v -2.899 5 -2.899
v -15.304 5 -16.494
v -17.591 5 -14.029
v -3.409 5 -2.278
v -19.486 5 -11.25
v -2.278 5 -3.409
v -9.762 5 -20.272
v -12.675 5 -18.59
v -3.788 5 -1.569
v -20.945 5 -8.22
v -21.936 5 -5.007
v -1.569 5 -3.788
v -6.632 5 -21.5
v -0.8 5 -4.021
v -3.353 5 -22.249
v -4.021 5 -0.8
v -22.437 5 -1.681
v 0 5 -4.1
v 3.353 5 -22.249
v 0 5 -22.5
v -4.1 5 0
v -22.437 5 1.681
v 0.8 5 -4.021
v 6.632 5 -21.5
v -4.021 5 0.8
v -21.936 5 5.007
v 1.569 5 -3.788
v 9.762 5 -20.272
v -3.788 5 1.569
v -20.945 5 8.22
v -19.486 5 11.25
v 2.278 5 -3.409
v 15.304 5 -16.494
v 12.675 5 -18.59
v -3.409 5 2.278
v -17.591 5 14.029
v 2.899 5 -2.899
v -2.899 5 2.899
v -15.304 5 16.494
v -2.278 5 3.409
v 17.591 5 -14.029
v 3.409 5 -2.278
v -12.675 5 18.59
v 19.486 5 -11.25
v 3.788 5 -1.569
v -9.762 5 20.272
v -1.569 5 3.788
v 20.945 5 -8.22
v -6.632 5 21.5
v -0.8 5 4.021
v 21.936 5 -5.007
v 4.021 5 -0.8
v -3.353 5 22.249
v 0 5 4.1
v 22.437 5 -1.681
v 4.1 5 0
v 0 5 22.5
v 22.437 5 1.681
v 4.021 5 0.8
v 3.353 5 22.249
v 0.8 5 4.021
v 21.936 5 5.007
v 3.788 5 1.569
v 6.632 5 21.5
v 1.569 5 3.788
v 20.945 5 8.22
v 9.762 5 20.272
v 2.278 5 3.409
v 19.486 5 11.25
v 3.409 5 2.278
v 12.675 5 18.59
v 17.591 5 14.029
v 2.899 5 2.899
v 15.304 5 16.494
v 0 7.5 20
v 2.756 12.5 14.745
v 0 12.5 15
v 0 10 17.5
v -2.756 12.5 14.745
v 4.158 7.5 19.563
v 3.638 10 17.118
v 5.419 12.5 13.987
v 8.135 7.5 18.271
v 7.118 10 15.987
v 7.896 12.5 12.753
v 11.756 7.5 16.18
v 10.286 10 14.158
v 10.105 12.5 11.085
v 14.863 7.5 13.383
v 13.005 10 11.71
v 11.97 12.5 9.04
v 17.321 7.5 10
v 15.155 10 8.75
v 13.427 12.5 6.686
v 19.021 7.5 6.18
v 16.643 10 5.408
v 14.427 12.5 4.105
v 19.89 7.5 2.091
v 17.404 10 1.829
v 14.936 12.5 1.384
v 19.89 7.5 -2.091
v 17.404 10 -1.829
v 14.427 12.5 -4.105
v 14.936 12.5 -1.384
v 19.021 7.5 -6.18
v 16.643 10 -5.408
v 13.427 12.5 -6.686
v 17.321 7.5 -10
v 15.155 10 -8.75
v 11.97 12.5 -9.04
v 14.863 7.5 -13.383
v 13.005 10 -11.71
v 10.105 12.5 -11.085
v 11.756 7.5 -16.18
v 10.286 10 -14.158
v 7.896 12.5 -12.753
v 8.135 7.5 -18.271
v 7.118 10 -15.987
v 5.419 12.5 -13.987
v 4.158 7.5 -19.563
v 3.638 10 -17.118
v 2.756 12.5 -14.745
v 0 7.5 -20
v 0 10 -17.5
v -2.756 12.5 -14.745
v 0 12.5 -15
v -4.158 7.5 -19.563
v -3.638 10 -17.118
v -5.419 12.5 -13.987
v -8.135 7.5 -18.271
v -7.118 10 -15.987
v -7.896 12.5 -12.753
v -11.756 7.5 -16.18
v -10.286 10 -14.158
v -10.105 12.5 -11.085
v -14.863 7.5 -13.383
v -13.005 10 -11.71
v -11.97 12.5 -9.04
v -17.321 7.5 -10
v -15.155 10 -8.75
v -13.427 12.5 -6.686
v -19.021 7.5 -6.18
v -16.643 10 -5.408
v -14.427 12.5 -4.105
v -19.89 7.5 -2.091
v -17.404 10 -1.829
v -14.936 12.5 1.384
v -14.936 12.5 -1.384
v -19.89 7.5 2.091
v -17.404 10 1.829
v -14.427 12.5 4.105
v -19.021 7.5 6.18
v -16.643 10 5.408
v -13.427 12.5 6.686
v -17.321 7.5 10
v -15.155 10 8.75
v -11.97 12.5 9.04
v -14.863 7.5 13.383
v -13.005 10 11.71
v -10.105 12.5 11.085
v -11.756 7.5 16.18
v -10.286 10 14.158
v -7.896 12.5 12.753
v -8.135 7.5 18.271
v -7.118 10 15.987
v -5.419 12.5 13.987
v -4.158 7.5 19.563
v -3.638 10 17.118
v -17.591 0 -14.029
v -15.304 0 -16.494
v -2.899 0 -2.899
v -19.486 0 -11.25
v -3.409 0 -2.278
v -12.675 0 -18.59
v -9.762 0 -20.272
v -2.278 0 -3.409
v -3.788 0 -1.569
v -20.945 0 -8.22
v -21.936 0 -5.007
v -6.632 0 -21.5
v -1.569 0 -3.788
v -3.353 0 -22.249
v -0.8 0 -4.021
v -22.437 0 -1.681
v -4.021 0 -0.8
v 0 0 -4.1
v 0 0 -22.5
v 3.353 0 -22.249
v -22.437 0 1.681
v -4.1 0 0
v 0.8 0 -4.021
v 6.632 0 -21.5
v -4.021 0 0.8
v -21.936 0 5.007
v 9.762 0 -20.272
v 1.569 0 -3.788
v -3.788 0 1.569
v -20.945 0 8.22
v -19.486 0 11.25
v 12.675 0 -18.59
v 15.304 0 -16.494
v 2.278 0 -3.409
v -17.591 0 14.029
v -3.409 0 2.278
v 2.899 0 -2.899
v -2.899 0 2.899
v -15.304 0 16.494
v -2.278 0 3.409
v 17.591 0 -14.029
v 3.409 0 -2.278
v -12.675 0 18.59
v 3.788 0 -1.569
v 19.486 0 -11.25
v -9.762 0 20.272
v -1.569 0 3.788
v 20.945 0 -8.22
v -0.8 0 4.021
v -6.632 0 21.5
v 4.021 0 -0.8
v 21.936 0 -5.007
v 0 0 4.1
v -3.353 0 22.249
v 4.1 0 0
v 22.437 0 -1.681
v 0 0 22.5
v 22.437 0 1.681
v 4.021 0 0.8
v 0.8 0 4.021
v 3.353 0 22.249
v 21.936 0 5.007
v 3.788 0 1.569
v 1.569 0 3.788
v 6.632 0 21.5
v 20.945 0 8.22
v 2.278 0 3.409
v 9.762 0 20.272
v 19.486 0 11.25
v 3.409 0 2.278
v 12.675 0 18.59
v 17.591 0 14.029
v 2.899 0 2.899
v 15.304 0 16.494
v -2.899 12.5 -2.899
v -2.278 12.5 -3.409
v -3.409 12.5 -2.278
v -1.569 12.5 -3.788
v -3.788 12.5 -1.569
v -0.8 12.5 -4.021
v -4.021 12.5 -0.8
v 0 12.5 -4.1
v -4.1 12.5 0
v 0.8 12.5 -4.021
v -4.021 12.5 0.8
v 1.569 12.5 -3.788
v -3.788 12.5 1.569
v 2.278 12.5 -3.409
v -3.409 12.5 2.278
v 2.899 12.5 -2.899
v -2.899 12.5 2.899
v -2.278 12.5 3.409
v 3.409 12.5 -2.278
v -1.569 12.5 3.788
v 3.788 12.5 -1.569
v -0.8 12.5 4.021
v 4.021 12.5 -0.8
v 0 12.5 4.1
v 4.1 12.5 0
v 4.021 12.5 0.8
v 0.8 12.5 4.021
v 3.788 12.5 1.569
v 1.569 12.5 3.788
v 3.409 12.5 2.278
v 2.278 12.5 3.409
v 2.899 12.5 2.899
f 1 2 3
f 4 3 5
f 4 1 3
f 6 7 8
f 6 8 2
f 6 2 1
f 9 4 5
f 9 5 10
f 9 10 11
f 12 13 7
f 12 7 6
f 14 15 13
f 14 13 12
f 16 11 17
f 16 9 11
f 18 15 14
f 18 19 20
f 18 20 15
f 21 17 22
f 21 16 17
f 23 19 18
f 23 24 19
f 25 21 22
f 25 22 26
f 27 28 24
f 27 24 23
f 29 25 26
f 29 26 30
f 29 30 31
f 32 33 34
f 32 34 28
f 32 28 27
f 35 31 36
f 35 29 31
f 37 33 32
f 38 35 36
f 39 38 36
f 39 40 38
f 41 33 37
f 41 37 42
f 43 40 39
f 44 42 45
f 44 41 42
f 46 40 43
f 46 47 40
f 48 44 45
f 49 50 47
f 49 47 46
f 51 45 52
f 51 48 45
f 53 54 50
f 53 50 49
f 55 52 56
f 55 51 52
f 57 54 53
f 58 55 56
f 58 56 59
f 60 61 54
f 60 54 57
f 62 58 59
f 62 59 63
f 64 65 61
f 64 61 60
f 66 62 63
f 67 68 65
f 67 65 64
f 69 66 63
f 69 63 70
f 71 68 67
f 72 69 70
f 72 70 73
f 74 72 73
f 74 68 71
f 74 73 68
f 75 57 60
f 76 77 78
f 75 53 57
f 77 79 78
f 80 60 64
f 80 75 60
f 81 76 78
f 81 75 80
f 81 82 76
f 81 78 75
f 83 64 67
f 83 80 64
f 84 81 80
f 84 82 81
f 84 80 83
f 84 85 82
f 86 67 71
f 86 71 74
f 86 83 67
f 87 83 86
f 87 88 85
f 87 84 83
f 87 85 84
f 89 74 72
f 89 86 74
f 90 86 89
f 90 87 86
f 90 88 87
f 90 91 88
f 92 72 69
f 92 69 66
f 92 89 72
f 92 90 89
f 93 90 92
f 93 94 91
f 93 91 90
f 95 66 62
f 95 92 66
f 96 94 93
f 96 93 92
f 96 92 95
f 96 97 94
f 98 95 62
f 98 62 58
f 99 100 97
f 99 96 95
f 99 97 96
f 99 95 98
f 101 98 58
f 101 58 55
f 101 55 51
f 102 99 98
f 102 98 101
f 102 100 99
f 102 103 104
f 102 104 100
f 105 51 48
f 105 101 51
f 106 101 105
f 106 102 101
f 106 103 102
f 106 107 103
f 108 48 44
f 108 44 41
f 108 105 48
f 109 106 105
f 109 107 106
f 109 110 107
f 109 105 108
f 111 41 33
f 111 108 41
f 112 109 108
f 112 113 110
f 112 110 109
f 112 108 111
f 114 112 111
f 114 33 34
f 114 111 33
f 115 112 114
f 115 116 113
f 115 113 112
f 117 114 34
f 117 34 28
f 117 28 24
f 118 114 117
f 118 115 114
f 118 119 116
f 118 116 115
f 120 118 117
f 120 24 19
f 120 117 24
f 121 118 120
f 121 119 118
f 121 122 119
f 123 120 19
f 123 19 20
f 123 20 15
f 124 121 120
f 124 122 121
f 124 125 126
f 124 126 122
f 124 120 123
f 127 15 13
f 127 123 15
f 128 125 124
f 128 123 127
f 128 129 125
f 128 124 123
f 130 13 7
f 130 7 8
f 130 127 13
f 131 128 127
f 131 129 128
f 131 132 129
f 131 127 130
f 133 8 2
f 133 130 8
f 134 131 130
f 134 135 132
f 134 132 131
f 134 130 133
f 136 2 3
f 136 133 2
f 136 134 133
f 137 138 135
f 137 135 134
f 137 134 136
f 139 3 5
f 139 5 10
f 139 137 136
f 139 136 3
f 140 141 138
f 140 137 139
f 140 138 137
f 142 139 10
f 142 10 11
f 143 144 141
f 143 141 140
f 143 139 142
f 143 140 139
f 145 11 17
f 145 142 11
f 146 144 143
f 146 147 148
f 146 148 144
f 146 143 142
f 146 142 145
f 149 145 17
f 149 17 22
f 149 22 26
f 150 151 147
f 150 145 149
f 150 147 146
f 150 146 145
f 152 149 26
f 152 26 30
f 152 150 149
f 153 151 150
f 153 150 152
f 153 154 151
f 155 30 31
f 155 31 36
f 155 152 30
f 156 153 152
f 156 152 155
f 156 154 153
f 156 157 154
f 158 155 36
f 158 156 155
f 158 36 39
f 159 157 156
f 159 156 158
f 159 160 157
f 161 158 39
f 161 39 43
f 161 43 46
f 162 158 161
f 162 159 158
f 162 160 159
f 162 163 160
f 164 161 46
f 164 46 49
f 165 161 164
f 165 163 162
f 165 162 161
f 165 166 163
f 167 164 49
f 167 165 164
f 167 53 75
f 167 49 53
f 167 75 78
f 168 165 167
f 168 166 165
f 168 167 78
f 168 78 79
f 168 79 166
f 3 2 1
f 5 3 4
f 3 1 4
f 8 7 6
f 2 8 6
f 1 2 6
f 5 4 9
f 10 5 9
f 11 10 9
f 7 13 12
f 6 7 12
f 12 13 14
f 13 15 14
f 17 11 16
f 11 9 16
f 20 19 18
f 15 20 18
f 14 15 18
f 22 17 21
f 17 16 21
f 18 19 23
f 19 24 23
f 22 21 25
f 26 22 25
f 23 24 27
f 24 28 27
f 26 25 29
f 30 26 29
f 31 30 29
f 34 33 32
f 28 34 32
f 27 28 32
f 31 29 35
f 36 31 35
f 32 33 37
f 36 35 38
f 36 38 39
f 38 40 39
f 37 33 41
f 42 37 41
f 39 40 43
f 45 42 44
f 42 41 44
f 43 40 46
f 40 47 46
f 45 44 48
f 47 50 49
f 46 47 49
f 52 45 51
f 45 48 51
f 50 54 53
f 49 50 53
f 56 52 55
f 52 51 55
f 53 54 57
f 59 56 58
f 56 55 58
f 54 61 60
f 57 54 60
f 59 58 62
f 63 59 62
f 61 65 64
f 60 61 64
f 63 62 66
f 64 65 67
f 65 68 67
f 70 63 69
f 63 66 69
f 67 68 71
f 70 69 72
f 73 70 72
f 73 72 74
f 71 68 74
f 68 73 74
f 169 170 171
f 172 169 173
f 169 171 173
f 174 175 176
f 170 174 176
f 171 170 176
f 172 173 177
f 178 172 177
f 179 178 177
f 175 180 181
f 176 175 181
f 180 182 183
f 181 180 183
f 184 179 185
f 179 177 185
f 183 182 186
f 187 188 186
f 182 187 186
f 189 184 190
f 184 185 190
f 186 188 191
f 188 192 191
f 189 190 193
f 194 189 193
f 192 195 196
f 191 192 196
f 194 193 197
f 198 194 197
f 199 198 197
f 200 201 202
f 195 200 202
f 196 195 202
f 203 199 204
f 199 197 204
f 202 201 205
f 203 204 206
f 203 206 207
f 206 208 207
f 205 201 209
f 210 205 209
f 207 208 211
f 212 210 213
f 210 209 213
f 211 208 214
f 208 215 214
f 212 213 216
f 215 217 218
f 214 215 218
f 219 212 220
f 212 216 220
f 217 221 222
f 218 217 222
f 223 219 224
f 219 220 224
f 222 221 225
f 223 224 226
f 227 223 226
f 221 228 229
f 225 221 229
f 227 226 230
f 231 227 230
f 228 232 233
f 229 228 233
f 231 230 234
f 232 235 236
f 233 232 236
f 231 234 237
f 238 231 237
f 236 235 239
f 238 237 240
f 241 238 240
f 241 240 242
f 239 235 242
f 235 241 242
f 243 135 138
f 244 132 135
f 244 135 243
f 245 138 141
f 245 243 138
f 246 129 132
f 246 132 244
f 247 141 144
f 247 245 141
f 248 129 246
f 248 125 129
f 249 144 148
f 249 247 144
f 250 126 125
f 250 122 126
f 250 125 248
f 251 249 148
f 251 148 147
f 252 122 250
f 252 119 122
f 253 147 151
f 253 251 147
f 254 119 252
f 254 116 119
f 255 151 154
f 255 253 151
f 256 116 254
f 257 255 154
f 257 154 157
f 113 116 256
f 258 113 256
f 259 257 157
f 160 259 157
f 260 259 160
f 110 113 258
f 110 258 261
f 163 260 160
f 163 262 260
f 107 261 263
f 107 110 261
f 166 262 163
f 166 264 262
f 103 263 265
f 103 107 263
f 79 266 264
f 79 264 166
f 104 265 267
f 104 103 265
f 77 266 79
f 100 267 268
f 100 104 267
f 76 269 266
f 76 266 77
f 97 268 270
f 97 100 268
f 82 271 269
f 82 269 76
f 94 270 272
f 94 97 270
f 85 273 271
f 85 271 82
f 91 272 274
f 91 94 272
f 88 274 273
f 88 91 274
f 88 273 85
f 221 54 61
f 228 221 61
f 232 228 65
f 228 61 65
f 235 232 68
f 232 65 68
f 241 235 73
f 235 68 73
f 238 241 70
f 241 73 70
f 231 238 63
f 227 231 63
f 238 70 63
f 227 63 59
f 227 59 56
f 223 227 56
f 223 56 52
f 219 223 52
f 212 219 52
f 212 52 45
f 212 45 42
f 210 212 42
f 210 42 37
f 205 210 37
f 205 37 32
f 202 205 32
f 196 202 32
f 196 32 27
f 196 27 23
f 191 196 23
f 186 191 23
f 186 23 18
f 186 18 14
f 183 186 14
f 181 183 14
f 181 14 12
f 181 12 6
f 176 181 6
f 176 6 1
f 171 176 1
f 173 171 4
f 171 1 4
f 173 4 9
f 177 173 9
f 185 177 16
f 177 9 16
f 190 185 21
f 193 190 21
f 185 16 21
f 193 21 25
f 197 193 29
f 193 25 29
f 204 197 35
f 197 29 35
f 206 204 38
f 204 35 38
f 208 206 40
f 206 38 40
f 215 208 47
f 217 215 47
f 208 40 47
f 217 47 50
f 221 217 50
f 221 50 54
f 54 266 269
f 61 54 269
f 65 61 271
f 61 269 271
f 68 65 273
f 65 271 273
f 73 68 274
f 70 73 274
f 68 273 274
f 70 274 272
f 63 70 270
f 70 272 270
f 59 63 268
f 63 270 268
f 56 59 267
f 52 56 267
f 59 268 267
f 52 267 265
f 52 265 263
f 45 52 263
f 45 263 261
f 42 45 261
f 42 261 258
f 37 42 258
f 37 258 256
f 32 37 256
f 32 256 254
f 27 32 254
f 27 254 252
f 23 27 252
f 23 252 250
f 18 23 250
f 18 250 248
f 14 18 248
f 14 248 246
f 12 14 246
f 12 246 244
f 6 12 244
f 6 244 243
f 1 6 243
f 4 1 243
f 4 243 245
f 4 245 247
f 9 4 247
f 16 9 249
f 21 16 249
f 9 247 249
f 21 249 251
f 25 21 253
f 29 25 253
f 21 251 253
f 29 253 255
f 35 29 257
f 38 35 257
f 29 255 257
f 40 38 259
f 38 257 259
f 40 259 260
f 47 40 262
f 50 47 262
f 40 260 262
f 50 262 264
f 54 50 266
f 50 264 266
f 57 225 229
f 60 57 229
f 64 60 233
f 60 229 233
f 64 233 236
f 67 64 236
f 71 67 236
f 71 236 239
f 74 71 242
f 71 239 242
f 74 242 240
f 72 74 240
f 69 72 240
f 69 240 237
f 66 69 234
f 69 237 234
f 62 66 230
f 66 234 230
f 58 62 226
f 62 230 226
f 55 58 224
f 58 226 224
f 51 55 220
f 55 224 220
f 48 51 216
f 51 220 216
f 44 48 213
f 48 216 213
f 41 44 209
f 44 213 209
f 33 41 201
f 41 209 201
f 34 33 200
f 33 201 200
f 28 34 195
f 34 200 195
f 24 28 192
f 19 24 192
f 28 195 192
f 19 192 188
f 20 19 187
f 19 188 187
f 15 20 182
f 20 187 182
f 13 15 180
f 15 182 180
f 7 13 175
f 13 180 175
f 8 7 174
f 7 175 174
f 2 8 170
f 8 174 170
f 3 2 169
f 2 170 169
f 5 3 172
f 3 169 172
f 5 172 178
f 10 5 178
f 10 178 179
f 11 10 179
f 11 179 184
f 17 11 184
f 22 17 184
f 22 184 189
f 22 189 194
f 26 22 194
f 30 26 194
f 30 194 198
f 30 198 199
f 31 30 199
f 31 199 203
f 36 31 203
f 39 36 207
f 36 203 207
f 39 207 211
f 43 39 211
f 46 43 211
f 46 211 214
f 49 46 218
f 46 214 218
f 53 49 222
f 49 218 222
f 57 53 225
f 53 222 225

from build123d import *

# Parameters (mm, degrees)
SKETCH2_R           = 22.5
BOSS_EXTRUDE1_DEPTH = 5
SKETCH3_R           = 22.5
BOSS_EXTRUDE2_DEPTH = 7.5
BOSS_EXTRUDE2_TAPER = 45
SKETCH4_R           = 4.1
CUT_EXTRUDE1_DEPTH  = 35.18698596


with BuildPart() as part:
    # Sketch2 → Boss-Extrude1 (new body)
    with BuildSketch(Plane(origin=(0, 0, 0), x_dir=(1, 0, 0), z_dir=(0, 1, 0))):
        with Locations(Location((0, 0, 0), (0, 0, 270))):
            Circle(SKETCH2_R)
    extrude(amount=BOSS_EXTRUDE1_DEPTH)


with BuildPart() as body_2:
    # Sketch3 → Boss-Extrude2 (new body)
    with BuildSketch(Plane(origin=(0, 5, 0), x_dir=(1, 0, 0), z_dir=(0, 1, 0))):
        with Locations(Location((0, 0, 0), (0, 0, 270))):
            Circle(SKETCH3_R)
    extrude(amount=BOSS_EXTRUDE2_DEPTH, taper=BOSS_EXTRUDE2_TAPER)


with BuildPart() as cut_extrude1_tool:
    # Sketch4 → Cut-Extrude1 (new, through all)
    with BuildSketch(Plane(origin=(0, 12.5, 0), x_dir=(1, 0, 0), z_dir=(0, 1, 0))):
        with Locations(Location((0, 0, 0), (0, 0, 270))):
            Circle(SKETCH4_R)
    extrude(amount=-CUT_EXTRUDE1_DEPTH)


with BuildPart() as part_1:
    add(part.part)

    # Cut-Extrude1: cut by cut_extrude1_tool
    add(cut_extrude1_tool.part, mode=Mode.SUBTRACT)


with BuildPart() as body_2_1:
    add(body_2.part)

    # Cut-Extrude1: cut by cut_extrude1_tool
    add(cut_extrude1_tool.part, mode=Mode.SUBTRACT)


solid = Compound([part_1.part, body_2_1.part])
